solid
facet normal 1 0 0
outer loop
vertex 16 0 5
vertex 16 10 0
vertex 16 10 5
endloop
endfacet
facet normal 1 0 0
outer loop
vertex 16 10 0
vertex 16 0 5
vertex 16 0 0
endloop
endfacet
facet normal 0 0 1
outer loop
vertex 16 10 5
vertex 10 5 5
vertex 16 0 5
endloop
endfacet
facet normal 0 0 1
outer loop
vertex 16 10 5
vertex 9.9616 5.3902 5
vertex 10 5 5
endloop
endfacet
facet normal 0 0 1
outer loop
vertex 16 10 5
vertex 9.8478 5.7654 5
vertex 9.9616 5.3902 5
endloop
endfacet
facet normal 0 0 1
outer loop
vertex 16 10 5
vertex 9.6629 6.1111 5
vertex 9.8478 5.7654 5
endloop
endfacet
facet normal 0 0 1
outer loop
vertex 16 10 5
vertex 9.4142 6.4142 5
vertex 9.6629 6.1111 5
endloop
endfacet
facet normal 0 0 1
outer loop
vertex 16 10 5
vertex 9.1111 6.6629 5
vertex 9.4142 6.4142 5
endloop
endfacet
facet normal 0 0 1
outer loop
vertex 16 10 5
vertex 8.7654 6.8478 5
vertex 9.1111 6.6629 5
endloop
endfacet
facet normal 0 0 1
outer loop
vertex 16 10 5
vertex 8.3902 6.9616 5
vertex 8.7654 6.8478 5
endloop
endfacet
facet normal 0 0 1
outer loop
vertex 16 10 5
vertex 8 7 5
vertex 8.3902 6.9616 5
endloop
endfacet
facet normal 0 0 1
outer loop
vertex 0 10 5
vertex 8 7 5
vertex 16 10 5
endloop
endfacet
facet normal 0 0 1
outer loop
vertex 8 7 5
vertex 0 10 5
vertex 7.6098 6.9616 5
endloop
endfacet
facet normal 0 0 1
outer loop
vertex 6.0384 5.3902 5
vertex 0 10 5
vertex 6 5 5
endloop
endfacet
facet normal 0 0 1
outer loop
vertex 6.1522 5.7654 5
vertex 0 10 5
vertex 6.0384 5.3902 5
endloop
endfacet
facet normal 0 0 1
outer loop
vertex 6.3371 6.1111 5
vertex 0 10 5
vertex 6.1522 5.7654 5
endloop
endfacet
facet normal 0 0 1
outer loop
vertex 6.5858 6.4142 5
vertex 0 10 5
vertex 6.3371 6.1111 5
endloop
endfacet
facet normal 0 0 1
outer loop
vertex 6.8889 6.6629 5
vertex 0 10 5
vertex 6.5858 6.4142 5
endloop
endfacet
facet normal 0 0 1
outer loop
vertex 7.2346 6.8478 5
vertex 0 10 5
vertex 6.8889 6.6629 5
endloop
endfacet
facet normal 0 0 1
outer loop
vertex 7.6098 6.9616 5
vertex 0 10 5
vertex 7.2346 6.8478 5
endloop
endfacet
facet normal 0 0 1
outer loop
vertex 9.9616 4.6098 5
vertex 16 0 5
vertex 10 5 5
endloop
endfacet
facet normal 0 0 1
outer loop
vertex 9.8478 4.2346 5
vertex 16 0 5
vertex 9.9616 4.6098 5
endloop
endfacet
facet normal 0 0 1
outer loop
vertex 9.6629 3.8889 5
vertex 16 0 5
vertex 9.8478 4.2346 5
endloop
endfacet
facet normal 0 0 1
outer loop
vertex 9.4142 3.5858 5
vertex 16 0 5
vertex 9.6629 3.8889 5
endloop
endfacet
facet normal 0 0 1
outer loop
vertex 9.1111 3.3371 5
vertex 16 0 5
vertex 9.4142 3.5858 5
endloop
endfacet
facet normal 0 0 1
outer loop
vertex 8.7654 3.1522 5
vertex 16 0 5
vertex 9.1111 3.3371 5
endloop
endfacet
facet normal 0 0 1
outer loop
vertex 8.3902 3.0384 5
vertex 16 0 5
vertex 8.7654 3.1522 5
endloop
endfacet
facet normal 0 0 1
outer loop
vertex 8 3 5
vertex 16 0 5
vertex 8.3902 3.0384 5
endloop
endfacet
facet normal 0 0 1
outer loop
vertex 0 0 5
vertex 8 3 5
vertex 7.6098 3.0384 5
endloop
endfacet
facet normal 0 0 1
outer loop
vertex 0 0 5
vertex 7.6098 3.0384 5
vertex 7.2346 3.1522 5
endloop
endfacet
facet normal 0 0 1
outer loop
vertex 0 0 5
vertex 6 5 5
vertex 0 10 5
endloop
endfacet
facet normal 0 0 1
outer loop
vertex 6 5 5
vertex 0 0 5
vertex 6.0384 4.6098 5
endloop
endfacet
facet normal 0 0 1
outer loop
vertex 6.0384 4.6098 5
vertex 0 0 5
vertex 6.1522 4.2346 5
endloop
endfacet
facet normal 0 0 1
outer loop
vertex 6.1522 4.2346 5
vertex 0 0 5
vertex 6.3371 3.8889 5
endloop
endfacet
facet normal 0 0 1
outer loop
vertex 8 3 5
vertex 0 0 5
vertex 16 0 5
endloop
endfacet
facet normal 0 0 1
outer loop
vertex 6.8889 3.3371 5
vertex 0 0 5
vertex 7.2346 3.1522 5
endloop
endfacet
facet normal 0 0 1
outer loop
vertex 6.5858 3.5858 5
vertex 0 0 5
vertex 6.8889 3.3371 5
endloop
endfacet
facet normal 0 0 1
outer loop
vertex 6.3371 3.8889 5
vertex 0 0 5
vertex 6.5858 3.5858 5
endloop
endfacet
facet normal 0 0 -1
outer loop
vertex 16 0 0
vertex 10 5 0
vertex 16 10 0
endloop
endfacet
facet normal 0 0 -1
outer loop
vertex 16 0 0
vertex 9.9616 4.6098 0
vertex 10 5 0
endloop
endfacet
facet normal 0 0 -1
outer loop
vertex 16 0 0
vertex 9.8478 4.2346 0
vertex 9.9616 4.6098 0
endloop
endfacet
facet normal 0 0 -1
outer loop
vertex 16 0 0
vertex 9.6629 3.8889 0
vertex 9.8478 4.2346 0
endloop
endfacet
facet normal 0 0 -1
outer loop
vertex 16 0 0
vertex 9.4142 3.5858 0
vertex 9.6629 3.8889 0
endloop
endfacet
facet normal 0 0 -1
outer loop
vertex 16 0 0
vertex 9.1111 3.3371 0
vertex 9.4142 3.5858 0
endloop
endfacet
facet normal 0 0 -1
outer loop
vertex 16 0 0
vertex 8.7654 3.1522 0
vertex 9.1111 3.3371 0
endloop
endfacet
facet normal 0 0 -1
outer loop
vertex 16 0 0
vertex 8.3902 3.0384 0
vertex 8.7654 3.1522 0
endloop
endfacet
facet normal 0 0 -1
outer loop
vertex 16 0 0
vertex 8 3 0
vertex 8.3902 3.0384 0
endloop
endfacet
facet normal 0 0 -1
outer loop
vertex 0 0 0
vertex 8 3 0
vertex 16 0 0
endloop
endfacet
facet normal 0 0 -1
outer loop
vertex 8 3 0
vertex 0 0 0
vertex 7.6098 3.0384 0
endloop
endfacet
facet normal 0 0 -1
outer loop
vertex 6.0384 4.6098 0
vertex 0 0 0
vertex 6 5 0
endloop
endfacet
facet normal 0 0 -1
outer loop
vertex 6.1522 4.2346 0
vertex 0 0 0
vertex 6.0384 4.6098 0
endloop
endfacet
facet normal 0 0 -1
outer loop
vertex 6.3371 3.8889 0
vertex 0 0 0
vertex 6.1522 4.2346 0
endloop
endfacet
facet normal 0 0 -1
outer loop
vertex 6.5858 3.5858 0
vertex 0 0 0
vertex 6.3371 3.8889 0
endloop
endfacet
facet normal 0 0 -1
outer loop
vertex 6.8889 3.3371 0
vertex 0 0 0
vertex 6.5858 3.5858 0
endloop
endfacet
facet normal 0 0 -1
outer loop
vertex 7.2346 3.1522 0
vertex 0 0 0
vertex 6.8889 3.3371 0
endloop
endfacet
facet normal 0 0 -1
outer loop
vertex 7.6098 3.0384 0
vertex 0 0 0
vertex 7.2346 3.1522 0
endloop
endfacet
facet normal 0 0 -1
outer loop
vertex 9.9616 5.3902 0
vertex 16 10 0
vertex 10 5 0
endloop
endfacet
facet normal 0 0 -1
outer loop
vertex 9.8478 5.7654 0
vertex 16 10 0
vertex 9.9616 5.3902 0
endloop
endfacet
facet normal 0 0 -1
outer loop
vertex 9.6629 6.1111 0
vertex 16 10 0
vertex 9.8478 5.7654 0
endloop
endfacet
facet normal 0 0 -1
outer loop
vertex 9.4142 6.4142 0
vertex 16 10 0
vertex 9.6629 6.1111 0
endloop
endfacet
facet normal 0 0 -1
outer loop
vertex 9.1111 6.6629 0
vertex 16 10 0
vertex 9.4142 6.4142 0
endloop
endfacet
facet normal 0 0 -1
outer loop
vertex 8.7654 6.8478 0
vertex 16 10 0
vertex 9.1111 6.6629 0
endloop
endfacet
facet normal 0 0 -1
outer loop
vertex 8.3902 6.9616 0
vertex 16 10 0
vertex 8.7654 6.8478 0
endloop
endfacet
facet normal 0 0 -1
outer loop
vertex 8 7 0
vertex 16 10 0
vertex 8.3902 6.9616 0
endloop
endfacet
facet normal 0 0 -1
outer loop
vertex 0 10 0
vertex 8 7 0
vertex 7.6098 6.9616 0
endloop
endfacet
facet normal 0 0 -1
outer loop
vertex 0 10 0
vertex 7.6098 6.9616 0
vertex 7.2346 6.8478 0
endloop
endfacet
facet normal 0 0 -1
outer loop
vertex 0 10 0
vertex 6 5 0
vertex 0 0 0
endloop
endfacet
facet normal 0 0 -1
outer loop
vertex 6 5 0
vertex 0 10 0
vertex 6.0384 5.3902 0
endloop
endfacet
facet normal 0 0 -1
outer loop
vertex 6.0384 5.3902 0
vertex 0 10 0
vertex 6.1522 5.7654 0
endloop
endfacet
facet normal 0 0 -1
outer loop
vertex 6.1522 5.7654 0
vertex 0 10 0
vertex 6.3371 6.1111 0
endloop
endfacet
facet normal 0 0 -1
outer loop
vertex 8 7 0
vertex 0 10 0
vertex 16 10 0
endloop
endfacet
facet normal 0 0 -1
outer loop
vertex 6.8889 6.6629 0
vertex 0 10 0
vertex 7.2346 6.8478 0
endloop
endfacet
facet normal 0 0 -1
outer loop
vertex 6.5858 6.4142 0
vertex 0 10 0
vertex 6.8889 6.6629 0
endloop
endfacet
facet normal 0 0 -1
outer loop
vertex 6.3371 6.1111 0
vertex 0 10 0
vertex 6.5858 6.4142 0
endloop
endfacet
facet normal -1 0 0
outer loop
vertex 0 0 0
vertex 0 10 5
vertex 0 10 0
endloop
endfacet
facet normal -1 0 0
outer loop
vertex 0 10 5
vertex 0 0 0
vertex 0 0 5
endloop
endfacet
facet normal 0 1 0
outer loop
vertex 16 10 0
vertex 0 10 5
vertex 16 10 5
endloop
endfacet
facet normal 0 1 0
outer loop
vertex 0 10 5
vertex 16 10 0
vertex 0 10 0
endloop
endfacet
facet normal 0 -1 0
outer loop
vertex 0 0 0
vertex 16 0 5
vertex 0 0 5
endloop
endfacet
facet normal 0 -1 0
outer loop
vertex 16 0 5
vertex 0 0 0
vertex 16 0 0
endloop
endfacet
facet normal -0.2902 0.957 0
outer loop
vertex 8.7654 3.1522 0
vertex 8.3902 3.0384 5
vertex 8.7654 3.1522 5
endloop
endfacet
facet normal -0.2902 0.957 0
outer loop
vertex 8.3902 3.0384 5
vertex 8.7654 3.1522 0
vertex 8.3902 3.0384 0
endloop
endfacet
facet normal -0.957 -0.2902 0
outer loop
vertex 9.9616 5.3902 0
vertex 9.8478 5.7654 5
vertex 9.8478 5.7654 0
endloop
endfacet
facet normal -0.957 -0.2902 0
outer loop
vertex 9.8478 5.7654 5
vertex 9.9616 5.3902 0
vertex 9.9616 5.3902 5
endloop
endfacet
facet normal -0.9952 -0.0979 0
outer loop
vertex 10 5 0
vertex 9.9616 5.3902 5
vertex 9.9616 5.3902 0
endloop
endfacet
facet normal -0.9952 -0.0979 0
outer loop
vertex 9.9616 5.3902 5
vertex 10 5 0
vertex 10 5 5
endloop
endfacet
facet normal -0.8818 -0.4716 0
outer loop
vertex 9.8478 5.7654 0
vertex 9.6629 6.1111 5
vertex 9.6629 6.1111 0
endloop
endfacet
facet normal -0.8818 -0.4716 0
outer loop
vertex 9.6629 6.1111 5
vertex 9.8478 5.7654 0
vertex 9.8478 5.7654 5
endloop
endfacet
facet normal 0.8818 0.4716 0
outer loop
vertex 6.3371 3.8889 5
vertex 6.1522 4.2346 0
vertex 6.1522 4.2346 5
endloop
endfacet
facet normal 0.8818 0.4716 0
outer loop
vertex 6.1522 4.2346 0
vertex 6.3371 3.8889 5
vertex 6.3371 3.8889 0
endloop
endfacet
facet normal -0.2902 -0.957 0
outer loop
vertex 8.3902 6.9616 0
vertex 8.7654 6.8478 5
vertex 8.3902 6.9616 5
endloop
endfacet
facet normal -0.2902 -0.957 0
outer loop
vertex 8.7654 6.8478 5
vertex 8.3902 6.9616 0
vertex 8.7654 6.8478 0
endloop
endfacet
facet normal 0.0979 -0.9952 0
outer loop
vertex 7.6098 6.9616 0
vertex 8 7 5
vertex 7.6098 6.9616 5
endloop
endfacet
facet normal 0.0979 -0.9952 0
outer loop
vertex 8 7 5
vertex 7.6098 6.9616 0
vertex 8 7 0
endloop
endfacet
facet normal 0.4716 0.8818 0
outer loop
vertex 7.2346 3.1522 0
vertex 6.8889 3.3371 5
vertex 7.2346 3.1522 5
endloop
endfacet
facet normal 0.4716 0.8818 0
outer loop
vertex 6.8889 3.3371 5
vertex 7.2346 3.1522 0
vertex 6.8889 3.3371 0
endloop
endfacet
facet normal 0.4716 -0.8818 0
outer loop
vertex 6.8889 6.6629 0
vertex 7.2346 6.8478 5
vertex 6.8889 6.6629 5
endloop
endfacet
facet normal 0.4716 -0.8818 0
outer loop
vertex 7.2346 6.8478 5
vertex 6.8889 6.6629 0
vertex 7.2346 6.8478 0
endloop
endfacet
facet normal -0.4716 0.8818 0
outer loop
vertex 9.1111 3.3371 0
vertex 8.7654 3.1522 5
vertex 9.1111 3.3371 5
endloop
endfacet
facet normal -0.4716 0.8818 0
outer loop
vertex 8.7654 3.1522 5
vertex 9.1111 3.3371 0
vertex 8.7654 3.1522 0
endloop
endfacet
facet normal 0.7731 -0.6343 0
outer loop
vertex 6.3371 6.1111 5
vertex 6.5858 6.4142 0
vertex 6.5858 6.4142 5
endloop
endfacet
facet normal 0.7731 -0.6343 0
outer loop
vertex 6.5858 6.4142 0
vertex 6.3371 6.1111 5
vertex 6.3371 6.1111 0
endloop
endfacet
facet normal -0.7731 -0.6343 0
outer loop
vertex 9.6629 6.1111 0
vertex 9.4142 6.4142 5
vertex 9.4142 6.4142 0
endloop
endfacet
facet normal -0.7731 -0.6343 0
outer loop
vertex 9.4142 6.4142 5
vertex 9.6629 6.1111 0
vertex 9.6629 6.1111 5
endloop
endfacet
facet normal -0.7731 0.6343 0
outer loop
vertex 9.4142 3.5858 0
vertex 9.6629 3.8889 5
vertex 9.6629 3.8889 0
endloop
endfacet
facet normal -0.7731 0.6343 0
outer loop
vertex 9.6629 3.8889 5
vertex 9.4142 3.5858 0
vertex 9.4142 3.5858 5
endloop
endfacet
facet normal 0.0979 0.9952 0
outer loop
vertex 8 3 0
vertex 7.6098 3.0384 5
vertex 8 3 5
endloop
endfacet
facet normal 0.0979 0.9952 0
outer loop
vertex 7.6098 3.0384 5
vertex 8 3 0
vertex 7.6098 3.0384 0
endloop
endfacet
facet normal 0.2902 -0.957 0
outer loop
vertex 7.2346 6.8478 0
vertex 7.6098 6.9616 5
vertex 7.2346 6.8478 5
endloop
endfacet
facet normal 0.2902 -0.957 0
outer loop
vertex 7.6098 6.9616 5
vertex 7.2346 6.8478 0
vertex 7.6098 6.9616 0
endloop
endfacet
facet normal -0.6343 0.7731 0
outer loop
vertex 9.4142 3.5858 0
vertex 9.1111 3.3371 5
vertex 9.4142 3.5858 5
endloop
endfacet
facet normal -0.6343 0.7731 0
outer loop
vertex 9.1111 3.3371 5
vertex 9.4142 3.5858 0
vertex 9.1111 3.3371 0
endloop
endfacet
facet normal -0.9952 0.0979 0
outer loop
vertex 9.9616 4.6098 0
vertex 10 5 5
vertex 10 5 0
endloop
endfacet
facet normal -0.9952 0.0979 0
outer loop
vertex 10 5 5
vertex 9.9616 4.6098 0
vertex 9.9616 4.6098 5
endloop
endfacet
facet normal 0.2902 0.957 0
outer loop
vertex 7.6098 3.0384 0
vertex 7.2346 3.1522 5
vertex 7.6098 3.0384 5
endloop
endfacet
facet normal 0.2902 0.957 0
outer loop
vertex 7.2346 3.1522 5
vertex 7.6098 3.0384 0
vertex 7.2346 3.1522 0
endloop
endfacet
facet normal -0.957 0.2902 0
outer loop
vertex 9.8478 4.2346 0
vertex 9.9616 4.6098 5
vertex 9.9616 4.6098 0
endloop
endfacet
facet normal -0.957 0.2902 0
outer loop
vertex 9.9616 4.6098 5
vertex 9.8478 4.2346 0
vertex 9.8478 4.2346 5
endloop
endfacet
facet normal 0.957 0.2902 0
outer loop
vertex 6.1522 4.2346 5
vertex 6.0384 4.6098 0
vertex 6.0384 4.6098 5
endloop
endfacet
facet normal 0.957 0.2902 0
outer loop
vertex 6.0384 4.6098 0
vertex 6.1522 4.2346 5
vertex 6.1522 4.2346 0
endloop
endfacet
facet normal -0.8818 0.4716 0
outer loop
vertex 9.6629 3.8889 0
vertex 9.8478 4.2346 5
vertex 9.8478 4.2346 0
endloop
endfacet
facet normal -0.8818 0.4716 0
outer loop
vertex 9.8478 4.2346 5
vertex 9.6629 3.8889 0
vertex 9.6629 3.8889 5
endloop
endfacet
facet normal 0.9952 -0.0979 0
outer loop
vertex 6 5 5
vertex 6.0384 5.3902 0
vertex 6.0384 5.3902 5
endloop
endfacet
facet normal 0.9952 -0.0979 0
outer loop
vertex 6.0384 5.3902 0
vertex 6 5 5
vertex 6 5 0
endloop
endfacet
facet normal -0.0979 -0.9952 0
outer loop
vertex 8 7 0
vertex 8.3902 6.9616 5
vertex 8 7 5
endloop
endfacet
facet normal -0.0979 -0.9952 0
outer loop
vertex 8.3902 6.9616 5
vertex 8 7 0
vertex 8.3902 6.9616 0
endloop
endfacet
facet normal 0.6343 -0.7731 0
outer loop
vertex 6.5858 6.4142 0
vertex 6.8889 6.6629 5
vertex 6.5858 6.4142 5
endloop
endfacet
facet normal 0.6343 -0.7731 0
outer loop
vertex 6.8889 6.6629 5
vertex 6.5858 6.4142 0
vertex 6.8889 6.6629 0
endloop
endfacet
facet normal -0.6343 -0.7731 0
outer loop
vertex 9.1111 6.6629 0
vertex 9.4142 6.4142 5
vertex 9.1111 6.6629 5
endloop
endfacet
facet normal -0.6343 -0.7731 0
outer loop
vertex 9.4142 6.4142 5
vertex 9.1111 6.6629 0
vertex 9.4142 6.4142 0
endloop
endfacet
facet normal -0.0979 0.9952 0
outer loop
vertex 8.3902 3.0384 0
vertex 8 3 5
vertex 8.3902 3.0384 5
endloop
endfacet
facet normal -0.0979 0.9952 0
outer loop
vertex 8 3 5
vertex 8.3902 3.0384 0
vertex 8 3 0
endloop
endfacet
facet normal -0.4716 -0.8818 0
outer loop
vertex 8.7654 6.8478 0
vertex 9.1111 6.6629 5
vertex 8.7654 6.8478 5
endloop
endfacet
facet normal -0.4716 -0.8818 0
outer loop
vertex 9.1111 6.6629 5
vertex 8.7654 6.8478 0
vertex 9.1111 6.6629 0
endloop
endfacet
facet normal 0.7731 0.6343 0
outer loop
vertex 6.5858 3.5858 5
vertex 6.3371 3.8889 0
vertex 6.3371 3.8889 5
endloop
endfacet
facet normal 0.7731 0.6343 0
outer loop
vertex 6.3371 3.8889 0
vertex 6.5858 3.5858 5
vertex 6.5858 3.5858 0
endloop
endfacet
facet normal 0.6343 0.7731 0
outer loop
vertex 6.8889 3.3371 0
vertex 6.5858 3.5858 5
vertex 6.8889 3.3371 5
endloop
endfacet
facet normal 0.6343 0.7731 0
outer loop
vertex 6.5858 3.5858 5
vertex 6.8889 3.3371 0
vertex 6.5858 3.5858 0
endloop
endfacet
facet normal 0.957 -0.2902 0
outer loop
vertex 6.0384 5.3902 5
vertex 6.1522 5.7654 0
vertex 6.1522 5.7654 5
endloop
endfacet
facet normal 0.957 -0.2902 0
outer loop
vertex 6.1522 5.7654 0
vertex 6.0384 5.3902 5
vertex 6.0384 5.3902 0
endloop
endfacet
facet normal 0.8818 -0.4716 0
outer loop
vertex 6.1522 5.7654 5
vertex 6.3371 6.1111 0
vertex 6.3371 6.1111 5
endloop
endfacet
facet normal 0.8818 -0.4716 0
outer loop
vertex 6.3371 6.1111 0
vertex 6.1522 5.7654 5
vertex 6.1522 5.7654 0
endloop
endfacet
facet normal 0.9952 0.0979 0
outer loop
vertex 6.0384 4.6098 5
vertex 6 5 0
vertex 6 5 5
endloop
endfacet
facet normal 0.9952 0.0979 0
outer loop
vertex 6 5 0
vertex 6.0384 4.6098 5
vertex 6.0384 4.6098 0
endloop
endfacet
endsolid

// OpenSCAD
$fn = 32;

// ----------------------------------------------------------------------
// Micro pad: drilled pad, 5-20 mm class
// ----------------------------------------------------------------------

// --- parameters (mm) ---
pad_l = 16;               // pad length, X
pad_w = 10;               // pad width, Y
pad_t = 5;                // pad thickness, Z
hole_d = 4;               // through hole diameter

difference() {
  cube([pad_l, pad_w, pad_t]);
  translate([pad_l / 2, pad_w / 2, -1])
    cylinder(h = pad_t + 2, d = hole_d);
}
